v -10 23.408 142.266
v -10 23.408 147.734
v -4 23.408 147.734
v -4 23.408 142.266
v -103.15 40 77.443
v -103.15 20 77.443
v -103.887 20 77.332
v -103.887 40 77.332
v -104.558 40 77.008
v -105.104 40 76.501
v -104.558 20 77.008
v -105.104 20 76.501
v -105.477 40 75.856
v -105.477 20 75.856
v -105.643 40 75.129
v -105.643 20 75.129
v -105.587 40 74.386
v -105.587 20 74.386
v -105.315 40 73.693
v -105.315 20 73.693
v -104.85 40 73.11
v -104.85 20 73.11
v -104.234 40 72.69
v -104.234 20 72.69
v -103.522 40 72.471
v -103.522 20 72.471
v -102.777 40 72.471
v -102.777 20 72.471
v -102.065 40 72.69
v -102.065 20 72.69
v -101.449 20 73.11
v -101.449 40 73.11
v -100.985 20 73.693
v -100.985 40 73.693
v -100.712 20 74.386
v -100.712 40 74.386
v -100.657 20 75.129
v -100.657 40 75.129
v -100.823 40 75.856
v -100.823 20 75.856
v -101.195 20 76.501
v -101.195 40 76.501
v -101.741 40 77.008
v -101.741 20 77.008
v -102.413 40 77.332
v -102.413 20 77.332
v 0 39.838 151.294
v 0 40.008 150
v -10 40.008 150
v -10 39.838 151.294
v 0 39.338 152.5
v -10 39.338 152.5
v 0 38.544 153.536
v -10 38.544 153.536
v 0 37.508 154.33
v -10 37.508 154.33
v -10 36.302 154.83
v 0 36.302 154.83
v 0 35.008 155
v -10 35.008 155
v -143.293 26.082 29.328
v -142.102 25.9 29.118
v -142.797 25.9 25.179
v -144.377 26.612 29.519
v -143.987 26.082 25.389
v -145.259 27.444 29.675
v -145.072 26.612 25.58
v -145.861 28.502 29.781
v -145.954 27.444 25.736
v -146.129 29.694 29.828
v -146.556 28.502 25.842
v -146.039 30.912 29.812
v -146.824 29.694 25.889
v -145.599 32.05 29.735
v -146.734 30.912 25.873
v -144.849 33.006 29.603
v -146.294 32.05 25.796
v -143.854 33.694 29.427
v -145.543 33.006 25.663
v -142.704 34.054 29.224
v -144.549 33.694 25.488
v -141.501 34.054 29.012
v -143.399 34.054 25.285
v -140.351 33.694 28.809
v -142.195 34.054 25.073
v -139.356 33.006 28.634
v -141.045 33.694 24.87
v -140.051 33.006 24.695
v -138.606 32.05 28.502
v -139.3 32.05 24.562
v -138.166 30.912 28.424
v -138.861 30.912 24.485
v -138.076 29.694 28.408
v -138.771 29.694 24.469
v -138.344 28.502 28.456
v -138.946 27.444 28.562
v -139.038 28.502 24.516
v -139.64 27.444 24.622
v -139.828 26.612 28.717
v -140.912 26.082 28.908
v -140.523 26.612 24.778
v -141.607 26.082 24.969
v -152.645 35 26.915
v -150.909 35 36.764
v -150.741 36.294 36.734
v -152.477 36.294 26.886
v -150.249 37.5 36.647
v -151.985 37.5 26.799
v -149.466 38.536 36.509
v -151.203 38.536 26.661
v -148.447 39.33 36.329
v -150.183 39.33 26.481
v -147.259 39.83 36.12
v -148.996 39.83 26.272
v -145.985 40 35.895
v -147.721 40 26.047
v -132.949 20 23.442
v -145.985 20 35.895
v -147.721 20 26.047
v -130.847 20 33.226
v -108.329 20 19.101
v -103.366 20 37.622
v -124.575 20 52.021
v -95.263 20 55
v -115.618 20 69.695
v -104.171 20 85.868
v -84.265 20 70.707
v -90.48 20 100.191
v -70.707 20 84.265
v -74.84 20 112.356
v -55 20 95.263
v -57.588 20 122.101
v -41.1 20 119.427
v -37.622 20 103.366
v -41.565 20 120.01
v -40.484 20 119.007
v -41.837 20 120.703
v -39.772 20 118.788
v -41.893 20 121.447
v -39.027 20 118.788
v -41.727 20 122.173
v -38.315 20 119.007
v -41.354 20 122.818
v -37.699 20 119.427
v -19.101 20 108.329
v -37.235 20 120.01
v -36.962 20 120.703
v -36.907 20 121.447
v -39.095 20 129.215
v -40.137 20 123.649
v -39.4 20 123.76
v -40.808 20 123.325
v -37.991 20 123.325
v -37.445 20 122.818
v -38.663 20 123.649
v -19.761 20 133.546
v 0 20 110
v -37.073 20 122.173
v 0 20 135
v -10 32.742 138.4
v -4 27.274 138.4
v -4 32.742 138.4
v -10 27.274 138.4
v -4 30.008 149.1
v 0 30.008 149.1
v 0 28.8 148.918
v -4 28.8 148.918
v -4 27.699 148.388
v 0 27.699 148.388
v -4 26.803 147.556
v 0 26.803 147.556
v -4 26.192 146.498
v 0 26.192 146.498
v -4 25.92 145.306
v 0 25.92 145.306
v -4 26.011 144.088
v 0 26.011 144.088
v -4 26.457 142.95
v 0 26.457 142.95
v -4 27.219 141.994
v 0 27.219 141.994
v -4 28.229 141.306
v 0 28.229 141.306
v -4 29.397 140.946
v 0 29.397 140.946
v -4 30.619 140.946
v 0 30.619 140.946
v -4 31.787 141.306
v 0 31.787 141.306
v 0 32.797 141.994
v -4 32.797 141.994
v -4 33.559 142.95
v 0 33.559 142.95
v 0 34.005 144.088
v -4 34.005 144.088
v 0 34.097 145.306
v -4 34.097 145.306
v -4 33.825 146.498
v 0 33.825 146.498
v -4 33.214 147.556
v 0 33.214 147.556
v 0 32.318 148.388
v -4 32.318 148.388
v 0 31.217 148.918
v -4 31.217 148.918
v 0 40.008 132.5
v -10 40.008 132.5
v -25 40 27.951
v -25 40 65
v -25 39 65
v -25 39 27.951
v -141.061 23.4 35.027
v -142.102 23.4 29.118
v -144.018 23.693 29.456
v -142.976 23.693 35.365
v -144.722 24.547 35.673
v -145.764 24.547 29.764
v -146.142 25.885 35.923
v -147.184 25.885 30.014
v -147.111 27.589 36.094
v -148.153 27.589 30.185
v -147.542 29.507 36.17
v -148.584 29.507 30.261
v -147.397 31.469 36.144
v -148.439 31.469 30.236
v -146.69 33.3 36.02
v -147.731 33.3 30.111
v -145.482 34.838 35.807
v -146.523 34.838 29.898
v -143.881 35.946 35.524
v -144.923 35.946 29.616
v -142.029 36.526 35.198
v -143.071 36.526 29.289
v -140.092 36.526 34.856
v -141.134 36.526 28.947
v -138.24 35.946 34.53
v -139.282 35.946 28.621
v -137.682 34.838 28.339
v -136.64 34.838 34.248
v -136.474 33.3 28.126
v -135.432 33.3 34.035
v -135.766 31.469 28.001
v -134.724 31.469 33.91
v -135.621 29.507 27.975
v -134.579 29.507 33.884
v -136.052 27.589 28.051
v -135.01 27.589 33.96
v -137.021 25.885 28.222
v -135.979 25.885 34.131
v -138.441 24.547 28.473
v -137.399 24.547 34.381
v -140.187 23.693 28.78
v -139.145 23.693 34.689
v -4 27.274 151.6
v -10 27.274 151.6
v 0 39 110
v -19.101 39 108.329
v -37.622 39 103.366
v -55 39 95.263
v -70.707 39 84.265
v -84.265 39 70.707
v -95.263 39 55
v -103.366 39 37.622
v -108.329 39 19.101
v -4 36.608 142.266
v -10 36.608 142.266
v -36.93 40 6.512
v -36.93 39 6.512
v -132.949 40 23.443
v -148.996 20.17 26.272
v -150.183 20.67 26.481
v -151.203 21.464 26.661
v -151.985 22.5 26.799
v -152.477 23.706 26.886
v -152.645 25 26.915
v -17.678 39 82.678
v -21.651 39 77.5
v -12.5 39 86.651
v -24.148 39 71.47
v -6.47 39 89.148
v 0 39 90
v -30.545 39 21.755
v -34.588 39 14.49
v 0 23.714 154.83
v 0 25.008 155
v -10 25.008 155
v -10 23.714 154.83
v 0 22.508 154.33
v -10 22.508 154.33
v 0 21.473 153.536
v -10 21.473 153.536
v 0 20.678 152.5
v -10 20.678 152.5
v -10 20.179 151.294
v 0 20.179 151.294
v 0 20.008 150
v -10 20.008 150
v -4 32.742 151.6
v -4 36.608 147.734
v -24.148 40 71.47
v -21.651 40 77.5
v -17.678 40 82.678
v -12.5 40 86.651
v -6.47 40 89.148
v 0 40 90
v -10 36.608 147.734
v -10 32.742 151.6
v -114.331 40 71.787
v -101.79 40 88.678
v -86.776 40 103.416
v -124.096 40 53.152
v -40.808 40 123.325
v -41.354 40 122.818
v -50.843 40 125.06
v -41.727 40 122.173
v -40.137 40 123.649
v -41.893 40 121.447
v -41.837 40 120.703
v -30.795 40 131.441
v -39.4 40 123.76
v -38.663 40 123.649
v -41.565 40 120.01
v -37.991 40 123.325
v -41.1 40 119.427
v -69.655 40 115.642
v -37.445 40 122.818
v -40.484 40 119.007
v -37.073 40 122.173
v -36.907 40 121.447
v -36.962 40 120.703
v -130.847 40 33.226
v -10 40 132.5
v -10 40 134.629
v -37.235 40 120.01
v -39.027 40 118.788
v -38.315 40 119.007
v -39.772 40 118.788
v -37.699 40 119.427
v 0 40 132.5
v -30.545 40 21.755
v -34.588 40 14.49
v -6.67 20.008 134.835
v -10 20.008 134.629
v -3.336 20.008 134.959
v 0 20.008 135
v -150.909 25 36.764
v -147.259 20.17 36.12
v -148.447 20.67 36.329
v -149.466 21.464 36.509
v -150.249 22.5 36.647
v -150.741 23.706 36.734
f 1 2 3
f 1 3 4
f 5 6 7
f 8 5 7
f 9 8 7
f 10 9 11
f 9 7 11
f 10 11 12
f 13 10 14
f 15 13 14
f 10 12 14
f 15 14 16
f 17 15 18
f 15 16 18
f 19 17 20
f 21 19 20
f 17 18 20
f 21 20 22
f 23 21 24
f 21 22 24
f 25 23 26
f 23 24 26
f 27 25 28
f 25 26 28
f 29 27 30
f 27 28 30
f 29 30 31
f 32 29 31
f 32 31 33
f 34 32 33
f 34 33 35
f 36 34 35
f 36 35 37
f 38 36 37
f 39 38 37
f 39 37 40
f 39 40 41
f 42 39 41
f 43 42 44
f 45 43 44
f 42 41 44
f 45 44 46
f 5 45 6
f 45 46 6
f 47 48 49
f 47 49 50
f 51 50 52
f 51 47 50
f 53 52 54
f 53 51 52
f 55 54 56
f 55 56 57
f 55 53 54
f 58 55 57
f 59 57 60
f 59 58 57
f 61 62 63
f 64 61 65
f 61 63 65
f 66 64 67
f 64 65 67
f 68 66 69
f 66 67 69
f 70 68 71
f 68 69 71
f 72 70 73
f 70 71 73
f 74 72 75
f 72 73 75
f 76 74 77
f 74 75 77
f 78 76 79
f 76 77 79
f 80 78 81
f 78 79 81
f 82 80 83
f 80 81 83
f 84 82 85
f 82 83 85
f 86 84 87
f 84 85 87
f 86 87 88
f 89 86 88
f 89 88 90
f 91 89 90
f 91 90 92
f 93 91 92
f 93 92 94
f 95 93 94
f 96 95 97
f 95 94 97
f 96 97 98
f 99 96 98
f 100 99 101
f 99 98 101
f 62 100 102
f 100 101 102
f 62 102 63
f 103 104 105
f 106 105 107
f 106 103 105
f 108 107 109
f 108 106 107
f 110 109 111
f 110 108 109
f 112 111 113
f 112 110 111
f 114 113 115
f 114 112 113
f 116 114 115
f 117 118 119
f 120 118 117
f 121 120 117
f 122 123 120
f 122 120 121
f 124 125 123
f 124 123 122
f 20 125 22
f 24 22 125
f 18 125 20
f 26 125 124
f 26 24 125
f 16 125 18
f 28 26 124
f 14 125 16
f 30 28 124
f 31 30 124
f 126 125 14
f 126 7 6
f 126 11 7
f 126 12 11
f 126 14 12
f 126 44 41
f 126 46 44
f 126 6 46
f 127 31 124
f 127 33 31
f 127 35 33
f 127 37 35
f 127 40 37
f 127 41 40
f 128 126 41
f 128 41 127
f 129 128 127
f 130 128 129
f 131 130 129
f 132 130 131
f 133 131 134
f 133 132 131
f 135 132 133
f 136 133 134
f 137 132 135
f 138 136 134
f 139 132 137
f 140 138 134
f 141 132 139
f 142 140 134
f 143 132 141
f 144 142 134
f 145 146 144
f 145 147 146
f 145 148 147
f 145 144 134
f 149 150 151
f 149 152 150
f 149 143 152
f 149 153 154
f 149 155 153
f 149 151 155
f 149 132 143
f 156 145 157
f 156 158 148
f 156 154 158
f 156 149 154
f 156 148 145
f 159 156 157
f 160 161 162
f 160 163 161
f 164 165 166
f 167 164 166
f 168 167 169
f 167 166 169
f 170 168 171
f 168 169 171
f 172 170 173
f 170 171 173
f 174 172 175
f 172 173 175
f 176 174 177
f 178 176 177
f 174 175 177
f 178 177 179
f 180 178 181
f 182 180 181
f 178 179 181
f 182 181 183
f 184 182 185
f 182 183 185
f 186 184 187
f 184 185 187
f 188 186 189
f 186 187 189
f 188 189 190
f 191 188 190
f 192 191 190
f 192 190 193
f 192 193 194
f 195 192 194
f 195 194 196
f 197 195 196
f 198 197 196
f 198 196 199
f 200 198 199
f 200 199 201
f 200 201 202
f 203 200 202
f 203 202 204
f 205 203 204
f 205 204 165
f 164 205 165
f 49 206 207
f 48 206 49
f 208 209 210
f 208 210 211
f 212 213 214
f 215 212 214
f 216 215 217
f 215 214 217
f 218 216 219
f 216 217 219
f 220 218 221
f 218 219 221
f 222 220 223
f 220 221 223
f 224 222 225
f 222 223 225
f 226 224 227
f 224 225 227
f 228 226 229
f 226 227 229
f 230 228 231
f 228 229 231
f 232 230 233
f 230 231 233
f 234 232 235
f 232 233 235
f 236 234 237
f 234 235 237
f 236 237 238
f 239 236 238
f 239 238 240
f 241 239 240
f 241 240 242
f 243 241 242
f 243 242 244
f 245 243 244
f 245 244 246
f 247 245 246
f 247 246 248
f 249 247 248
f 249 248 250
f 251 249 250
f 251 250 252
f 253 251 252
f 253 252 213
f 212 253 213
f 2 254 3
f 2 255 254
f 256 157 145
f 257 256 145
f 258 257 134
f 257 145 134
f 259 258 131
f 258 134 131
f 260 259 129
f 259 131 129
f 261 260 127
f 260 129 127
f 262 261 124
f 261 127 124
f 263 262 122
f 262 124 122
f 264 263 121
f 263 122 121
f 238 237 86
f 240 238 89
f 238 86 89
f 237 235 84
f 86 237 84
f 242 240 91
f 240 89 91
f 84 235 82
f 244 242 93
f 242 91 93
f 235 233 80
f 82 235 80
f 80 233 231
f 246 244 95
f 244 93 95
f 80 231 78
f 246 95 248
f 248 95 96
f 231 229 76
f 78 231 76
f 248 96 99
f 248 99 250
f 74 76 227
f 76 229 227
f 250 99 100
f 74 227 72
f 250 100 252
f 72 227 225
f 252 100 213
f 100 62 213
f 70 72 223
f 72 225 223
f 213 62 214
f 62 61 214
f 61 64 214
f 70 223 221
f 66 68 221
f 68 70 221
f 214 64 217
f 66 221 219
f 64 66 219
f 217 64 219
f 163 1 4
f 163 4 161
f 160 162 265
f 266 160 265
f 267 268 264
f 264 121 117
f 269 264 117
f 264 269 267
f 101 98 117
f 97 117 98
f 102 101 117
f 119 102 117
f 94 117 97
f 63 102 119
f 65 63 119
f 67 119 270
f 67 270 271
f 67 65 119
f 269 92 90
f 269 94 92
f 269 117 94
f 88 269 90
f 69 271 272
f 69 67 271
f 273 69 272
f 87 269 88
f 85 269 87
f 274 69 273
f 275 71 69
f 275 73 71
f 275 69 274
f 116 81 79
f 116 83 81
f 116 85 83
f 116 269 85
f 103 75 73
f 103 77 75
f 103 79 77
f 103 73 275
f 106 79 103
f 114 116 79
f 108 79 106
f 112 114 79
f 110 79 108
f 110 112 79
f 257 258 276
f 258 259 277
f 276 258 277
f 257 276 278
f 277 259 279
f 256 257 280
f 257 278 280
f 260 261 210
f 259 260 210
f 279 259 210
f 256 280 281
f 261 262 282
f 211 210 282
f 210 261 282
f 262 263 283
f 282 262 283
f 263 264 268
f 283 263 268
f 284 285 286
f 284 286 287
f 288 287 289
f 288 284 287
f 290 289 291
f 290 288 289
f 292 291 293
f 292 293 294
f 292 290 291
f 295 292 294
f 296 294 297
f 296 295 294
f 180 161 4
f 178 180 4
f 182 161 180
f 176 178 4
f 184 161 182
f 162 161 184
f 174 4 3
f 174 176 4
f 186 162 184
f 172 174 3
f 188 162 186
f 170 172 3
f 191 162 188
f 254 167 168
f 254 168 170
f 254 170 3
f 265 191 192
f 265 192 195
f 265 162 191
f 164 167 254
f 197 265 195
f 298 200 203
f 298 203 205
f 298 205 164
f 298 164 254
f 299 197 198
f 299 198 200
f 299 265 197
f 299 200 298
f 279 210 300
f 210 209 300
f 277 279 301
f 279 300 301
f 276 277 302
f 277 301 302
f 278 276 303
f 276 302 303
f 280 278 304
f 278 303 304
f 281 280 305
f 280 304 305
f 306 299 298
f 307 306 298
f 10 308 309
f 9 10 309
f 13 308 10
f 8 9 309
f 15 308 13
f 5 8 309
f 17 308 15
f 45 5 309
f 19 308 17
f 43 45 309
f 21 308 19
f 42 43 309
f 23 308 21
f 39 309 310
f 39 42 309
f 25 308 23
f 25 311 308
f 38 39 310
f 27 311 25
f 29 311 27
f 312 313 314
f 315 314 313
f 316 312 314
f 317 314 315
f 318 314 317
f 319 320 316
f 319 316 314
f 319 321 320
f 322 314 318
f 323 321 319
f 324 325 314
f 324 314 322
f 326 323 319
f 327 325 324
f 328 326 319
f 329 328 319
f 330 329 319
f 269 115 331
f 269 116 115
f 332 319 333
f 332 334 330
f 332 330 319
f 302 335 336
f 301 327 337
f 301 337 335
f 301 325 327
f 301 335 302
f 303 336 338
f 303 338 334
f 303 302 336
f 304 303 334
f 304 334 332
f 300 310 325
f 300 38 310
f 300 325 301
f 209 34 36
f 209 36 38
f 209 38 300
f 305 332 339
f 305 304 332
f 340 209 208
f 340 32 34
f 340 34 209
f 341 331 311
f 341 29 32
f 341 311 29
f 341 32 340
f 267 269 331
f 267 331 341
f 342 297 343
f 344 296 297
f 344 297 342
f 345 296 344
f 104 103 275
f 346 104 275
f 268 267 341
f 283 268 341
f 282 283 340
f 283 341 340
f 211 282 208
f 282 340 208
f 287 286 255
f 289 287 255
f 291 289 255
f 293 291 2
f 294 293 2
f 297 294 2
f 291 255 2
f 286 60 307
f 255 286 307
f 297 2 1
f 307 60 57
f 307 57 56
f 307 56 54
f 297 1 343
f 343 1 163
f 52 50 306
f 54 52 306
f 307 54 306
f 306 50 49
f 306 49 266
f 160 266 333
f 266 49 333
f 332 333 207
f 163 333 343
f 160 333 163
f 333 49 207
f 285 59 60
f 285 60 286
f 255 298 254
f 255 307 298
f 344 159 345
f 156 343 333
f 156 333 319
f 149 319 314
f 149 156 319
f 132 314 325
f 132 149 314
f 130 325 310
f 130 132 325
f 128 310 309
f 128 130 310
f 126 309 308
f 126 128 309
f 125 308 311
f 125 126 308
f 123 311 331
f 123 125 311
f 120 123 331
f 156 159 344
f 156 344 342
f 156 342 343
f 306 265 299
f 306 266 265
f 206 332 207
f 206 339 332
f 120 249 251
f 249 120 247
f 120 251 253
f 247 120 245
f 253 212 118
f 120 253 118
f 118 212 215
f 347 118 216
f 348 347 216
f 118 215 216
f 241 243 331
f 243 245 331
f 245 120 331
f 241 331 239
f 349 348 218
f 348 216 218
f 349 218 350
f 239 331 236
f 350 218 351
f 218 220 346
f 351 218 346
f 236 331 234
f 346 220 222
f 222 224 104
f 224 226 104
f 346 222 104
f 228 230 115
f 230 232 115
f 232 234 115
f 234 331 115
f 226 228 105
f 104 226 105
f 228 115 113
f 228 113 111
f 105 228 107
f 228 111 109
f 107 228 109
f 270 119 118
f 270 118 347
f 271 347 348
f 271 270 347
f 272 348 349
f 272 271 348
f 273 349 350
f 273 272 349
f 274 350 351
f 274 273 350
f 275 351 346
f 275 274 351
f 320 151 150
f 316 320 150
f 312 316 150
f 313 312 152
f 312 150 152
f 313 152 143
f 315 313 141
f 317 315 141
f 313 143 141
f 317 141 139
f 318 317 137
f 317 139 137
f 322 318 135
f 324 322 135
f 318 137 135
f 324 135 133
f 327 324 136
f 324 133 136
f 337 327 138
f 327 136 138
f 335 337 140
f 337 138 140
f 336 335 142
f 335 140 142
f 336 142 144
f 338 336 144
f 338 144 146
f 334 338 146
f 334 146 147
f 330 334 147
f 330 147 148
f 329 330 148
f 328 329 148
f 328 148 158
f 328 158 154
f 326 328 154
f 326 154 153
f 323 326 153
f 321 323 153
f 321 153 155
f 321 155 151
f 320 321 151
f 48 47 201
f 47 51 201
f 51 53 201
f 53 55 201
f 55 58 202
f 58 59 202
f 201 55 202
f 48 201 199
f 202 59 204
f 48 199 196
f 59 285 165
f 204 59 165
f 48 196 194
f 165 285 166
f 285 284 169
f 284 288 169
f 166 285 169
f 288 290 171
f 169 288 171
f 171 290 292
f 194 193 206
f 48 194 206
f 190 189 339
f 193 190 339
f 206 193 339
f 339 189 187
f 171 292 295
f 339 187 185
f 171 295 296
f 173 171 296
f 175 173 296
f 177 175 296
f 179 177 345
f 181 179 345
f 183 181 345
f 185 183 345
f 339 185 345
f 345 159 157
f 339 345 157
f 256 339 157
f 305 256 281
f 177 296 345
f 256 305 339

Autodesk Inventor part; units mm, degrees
ref_plane "YZ Plane" through (0, 0, 0) normal (1, 0, 0) x (0, 1, 0)
ref_plane "XZ Plane" through (0, 0, 0) normal (0, 1, 0) x (-1, 0, 0)
ref_plane "XY Plane" through (0, 0, 0) normal (0, 0, 1) x (1, 0, 0)
sketch "Sketch1" plane through (0, 0, 0) normal (0, 1, 0) x (-1, 0, 0)
  circle A0 centre (0, 0) radius 135
  circle A1 centre (0, 0) radius 110
  dimension "d0" = 270
  dimension "d1" = 220
extrude "Extrusion1" add sketch "Sketch1" along normal blind 55
sketch "Sketch2" plane through (0, 0, 0) normal (0, 0, 1) x (1, 0, 0)
  circle A0 centre (0, 5) radius 18
  line L0 (135, 0) -> (-135, 0) projected
  point P0 (0, 0)
  dimension "d4" = 36
  dimension "d5" = 5
extrude "Extrusion2" cut sketch "Sketch2" against normal through all
sketch "Sketch3" plane through (0, 0, 0) normal (0, -1, 0) x (1, 0, 0)
  circle A0 centre (0, 0) radius 140
extrude "Extrusion3" cut sketch "Sketch3" against normal blind 20
sketch "Sketch4" plane through (0, 20, 0) normal (0, -1, 0) x (1, 0, 0)
  line L0 (0, 0) -> (70, 0)
  line L1 (80, -100) -> (60, -100)
  line L2 (60, -100) -> (60, 100)
  line L3 (60, 100) -> (80, 100)
  line L4 (80, 100) -> (80, -100)
  line L5 (80, -100) -> (60, 100) construction
  line L6 (60, -100) -> (80, 100) construction
  dimension "d10" = 70
  dimension "d11" = 20
  dimension "d12" = 200
extrude "Extrusion4" cut sketch "Sketch4" against normal through all
sketch "Sketch5" plane through (0, 55, 0) normal (0, 1, 0) x (1, 0, 0)
  circle A0 centre (0, 0) radius 127.5
  circle A1 centre (127.5, 0) radius 2
  circle A2 centre (103.1497, 74.9426) radius 2
  circle A3 centre (39.3997, 121.2597) radius 2
  circle A4 centre (-39.3997, 121.2597) radius 2
  circle A5 centre (-103.1497, 74.9426) radius 2
  circle A6 centre (-127.5, 0) radius 2
  circle A7 centre (-103.1497, -74.9426) radius 2
  circle A8 centre (-39.3997, -121.2597) radius 2
  circle A9 centre (39.3997, -121.2597) radius 2
  circle A10 centre (103.1497, -74.9426) radius 2
  dimension "d15" = 255
  dimension "d16" = 4
  dimension "d19" = 360
hole "Hole1" at (127.5, 55, 0) at (103.1497, 55, 74.9426) at (39.3997, 55, 121.2597) at (-39.3997, 55, 121.2597) at (-103.1497, 55, 74.9426) at (-127.5, 55, 0) at (-103.1497, 55, -74.9426) at (-39.3997, 55, -121.2597) at (39.3997, 55, -121.2597) at (103.1497, 55, -74.9426) direction (0, -1, 0) diameter 5 end through all
sketch "Sketch6" plane through (0, 55, 0) normal (0, 1, 0) x (1, 0, 0)
  circle A0 centre (0, 0) radius 140
extrude "Extrusion5" cut sketch "Sketch6" against normal blind 15
sketch "Sketch7" plane through (0, 40, 0) normal (0, 1, 0) x (1, 0, 0)
  circle A0 centre (0, 0) radius 140
  line L0 (80, -100) -> (80, -75.4983) projected
  line L1 (80, -100) -> (80, -75.4983)
  line L2 (60, -100) -> (80, -100) projected
  line L3 (80, -100) -> (60, -100)
  line L4 (60, -100) -> (60, -92.1954)
  line L5 (60, 100) -> (60, 92.1954) projected
  line L6 (60, 92.1954) -> (60, 100)
  line L7 (60, 100) -> (80, 100)
  line L8 (80, 100) -> (80, 75.4983)
  arc A1 (80, -75.4983) -> (80, 75.4983) centre (0, 0) ccw
  arc A2 (60, 92.1954) -> (60, -92.1954) centre (0, 0) ccw
  arc A3 (-25, -65) -> (25, -65) centre (0, -65) ccw
  arc A4 (25, 65) -> (-25, 65) centre (0, 65) ccw
  arc A5 (25, -27.9508) -> (25, 27.9508) centre (0, 0) ccw
  arc A6 (-25, 27.9508) -> (-25, -27.9508) centre (0, 0) ccw
  line L9 (25, 65) -> (25, 27.9508)
  line L10 (25, -27.9508) -> (25, -65)
  line L11 (-25, -65) -> (-25, -27.9508)
  line L12 (-25, 27.9508) -> (-25, 65)
extrude "Extrusion6" add sketch "Sketch7" against normal blind 1 contours L2 L4 A2 L5 L7 L8 A1 L0
sketch "Sketch8" plane through (0, 39, 0) normal (0, -1, 0) x (1, 0, 0)
  line L0 (80, -75.4983) -> (80, -100) projected
  line L1 (80, -100) -> (60, -100)
  line L2 (60, -100) -> (60, 100)
  line L3 (60, 100) -> (80, 100)
  line L4 (80, 100) -> (80, 75.4983)
  line L5 (80, -75.4983) -> (80, -100)
  arc A0 (80, -75.4983) -> (80, 75.4983) centre (0, 0) ccw
  arc A1 (60, 92.1954) -> (60, -92.1954) centre (0, 0) ccw
extrude "Extrusion7" add sketch "Sketch8" along normal blind 14 contours L0 L1 L2 L3 L4 A0
sketch "Sketch9" plane through (0, 20, 0) normal (0, -1, 0) x (1, 0, 0)
  arc A0 (9.9499, -134.6328) -> (-9.9499, -134.6328) centre (0, 0) ccw projected
  spline S0 degree 7 poles (9.9499, -134.6328) (9.4556, -134.6694) (8.9421, -134.7052) (8.4096, -134.74) (7.8582, -134.7735) (7.2882, -134.8052) (6.6998, -134.835) (5.2633, -134.8999) (4.3998, -134.933) (3.5087, -134.9604) (2.5962, -134.9814) (1.6691, -134.9951) (0.7345, -135.0012) (-1.7136, -134.9976) (-3.2083, -134.9756) (-4.6621, -134.9347) (-6.0536, -134.8776) (-7.364, -134.8084) (-8.5782, -134.7318) (-9.7236, -134.6494) (-9.7616, -134.6466) (-9.7995, -134.6439) (-9.8372, -134.6411) (-9.8749, -134.6384) (-9.9124, -134.6356) (-9.9499, -134.6328) knots 0 0 0 0 0 0 0 0 0.214533 0.214533 0.214533 0.214533 0.214533 0.214533 0.508291 0.508291 0.508291 0.508291 0.508291 0.508291 0.983641 0.983641 0.983641 0.983641 0.983641 0.983641 1 1 1 1 1 1 1 1 projected
  line L0 (0, 135) -> (0, -135)
  line L1 (132.949, -23.4425) -> (-132.949, 23.4425)
  point P0 (0, 0)
  dimension "d40" = 80
extrude "Extrusion8" cut sketch "Sketch9" against normal through all contours S0 L0 L1 A0 | L1 L0 A0 | S0 A0 L1 L0 picked at (5.2242, 89.6957)
sketch "Sketch10" plane through (-132.949, 20, 23.4425) normal (-0.1736482, 0, -0.9848078) x (-0.9848078, 0, 0.1736482)
  line L0 (-111.5575, 20) -> (0, 20) projected
  line L1 (-2.5, 20) -> (15, 20)
  line L2 (20, 15) -> (20, 5)
  line L3 (15, 0) -> (-2.5, 0)
  line L4 (-2.5, 0) -> (-2.5, 20)
  line L5 (0, 20) -> (0, 0) projected
  arc A0 (20, 15) -> (15, 20) centre (15, 15) ccw
  arc A1 (15, 0) -> (20, 5) centre (15, 5) ccw
  point P0 (-135, -20)
  point P1 (20, 0)
  point P2 (20, 20)
  dimension "d43" = 22.5
  dimension "d44" = 20
  dimension "d45" = 20
  dimension "d46" = 5
extrude "Extrusion9" add sketch "Sketch10" against normal blind 10
sketch "Sketch11" plane through (0, 20, 135) normal (1, 0, 0) x (0, 0, -1)
  line L0 (2.5, 20.0082) -> (-15, 20.0082)
  line L1 (-20, 15.0082) -> (-20, 5.0082)
  line L2 (-15, 0.0082) -> (2.5, 0.0082)
  line L3 (2.5, 0.0082) -> (2.5, 20.0082)
  line L4 (0, 0) -> (0, 20) projected
  arc A0 (-15, 20.0082) -> (-20, 15.0082) centre (-15, 15.0082) ccw
  arc A1 (-20, 5.0082) -> (-15, 0.0082) centre (-15, 5.0082) ccw
  point P0 (135, -20)
  point P1 (-20, 0.0082)
  point P2 (-20, 20.0082)
  dimension "d50" = 22.5
  dimension "d51" = 20
  dimension "d52" = 20
  dimension "d53" = 5
extrude "Extrusion10" add sketch "Sketch11" against normal blind 10
sketch "Sketch12" plane through (-131.2126, 20, 33.2906) normal (0.1736482, 0, 0.9848078) x (0.9848078, 0, -0.1736482)
  line L0 (-15, 0) -> (0.3709, 0) projected
  line L1 (-20, 15) -> (-20, 5) projected
  point P0 (135, -20)
  point P1 (-10, 10)
  dimension "d58" = 10
  dimension "d59" = 10
hole "Hole2" at (-141.0606, 30, 35.0271) direction (-0.1736482, 0, -0.9848078) diameter 8.2 end through all counterbore diameter 13.2 counterbore depth 6
sketch "Sketch13" plane through (-10, 20, 135) normal (-1, 0, 0) x (0, 0, 1)
  line L0 (7.2662, 3.4082) -> (3.4, 7.2743)
  line L1 (3.4, 7.2743) -> (3.4, 12.742)
  line L2 (3.4, 12.742) -> (7.2662, 16.6082)
  line L3 (7.2662, 16.6082) -> (12.7338, 16.6082)
  line L4 (12.7338, 16.6082) -> (16.6, 12.742)
  line L5 (16.6, 12.742) -> (16.6, 7.2743)
  line L6 (16.6, 7.2743) -> (12.7338, 3.4082)
  line L7 (12.7338, 3.4082) -> (7.2662, 3.4082)
  line L8 (-0.3709, 0.0082) -> (15, 0.0082) projected
  line L9 (20, 5.0082) -> (20, 15.0082) projected
  point P0 (-135, -20)
  point P1 (10, 10.0082)
  dimension "d67" = 10
  dimension "d68" = 10
  dimension "d69" = 13.2
extrude "Extrusion11" cut sketch "Sketch13" against normal blind 6
sketch "Sketch14" plane through (-4, 20, 135) normal (-1, 0, 0) x (0, 0, 1)
  line L0 (15, 0.0082) -> (0, 0.0082) projected
  line L1 (20, 15.0082) -> (20, 5.0082) projected
  point P0 (-135, -20)
  point P1 (10, 10.0082)
  dimension "d72" = 10
  dimension "d73" = 10
hole "Hole3" at (-4, 30.0082, 145) direction (1, 0, 0) diameter 8.2 end through all
properties part number "Cylinder Spacer Top_Q4"
